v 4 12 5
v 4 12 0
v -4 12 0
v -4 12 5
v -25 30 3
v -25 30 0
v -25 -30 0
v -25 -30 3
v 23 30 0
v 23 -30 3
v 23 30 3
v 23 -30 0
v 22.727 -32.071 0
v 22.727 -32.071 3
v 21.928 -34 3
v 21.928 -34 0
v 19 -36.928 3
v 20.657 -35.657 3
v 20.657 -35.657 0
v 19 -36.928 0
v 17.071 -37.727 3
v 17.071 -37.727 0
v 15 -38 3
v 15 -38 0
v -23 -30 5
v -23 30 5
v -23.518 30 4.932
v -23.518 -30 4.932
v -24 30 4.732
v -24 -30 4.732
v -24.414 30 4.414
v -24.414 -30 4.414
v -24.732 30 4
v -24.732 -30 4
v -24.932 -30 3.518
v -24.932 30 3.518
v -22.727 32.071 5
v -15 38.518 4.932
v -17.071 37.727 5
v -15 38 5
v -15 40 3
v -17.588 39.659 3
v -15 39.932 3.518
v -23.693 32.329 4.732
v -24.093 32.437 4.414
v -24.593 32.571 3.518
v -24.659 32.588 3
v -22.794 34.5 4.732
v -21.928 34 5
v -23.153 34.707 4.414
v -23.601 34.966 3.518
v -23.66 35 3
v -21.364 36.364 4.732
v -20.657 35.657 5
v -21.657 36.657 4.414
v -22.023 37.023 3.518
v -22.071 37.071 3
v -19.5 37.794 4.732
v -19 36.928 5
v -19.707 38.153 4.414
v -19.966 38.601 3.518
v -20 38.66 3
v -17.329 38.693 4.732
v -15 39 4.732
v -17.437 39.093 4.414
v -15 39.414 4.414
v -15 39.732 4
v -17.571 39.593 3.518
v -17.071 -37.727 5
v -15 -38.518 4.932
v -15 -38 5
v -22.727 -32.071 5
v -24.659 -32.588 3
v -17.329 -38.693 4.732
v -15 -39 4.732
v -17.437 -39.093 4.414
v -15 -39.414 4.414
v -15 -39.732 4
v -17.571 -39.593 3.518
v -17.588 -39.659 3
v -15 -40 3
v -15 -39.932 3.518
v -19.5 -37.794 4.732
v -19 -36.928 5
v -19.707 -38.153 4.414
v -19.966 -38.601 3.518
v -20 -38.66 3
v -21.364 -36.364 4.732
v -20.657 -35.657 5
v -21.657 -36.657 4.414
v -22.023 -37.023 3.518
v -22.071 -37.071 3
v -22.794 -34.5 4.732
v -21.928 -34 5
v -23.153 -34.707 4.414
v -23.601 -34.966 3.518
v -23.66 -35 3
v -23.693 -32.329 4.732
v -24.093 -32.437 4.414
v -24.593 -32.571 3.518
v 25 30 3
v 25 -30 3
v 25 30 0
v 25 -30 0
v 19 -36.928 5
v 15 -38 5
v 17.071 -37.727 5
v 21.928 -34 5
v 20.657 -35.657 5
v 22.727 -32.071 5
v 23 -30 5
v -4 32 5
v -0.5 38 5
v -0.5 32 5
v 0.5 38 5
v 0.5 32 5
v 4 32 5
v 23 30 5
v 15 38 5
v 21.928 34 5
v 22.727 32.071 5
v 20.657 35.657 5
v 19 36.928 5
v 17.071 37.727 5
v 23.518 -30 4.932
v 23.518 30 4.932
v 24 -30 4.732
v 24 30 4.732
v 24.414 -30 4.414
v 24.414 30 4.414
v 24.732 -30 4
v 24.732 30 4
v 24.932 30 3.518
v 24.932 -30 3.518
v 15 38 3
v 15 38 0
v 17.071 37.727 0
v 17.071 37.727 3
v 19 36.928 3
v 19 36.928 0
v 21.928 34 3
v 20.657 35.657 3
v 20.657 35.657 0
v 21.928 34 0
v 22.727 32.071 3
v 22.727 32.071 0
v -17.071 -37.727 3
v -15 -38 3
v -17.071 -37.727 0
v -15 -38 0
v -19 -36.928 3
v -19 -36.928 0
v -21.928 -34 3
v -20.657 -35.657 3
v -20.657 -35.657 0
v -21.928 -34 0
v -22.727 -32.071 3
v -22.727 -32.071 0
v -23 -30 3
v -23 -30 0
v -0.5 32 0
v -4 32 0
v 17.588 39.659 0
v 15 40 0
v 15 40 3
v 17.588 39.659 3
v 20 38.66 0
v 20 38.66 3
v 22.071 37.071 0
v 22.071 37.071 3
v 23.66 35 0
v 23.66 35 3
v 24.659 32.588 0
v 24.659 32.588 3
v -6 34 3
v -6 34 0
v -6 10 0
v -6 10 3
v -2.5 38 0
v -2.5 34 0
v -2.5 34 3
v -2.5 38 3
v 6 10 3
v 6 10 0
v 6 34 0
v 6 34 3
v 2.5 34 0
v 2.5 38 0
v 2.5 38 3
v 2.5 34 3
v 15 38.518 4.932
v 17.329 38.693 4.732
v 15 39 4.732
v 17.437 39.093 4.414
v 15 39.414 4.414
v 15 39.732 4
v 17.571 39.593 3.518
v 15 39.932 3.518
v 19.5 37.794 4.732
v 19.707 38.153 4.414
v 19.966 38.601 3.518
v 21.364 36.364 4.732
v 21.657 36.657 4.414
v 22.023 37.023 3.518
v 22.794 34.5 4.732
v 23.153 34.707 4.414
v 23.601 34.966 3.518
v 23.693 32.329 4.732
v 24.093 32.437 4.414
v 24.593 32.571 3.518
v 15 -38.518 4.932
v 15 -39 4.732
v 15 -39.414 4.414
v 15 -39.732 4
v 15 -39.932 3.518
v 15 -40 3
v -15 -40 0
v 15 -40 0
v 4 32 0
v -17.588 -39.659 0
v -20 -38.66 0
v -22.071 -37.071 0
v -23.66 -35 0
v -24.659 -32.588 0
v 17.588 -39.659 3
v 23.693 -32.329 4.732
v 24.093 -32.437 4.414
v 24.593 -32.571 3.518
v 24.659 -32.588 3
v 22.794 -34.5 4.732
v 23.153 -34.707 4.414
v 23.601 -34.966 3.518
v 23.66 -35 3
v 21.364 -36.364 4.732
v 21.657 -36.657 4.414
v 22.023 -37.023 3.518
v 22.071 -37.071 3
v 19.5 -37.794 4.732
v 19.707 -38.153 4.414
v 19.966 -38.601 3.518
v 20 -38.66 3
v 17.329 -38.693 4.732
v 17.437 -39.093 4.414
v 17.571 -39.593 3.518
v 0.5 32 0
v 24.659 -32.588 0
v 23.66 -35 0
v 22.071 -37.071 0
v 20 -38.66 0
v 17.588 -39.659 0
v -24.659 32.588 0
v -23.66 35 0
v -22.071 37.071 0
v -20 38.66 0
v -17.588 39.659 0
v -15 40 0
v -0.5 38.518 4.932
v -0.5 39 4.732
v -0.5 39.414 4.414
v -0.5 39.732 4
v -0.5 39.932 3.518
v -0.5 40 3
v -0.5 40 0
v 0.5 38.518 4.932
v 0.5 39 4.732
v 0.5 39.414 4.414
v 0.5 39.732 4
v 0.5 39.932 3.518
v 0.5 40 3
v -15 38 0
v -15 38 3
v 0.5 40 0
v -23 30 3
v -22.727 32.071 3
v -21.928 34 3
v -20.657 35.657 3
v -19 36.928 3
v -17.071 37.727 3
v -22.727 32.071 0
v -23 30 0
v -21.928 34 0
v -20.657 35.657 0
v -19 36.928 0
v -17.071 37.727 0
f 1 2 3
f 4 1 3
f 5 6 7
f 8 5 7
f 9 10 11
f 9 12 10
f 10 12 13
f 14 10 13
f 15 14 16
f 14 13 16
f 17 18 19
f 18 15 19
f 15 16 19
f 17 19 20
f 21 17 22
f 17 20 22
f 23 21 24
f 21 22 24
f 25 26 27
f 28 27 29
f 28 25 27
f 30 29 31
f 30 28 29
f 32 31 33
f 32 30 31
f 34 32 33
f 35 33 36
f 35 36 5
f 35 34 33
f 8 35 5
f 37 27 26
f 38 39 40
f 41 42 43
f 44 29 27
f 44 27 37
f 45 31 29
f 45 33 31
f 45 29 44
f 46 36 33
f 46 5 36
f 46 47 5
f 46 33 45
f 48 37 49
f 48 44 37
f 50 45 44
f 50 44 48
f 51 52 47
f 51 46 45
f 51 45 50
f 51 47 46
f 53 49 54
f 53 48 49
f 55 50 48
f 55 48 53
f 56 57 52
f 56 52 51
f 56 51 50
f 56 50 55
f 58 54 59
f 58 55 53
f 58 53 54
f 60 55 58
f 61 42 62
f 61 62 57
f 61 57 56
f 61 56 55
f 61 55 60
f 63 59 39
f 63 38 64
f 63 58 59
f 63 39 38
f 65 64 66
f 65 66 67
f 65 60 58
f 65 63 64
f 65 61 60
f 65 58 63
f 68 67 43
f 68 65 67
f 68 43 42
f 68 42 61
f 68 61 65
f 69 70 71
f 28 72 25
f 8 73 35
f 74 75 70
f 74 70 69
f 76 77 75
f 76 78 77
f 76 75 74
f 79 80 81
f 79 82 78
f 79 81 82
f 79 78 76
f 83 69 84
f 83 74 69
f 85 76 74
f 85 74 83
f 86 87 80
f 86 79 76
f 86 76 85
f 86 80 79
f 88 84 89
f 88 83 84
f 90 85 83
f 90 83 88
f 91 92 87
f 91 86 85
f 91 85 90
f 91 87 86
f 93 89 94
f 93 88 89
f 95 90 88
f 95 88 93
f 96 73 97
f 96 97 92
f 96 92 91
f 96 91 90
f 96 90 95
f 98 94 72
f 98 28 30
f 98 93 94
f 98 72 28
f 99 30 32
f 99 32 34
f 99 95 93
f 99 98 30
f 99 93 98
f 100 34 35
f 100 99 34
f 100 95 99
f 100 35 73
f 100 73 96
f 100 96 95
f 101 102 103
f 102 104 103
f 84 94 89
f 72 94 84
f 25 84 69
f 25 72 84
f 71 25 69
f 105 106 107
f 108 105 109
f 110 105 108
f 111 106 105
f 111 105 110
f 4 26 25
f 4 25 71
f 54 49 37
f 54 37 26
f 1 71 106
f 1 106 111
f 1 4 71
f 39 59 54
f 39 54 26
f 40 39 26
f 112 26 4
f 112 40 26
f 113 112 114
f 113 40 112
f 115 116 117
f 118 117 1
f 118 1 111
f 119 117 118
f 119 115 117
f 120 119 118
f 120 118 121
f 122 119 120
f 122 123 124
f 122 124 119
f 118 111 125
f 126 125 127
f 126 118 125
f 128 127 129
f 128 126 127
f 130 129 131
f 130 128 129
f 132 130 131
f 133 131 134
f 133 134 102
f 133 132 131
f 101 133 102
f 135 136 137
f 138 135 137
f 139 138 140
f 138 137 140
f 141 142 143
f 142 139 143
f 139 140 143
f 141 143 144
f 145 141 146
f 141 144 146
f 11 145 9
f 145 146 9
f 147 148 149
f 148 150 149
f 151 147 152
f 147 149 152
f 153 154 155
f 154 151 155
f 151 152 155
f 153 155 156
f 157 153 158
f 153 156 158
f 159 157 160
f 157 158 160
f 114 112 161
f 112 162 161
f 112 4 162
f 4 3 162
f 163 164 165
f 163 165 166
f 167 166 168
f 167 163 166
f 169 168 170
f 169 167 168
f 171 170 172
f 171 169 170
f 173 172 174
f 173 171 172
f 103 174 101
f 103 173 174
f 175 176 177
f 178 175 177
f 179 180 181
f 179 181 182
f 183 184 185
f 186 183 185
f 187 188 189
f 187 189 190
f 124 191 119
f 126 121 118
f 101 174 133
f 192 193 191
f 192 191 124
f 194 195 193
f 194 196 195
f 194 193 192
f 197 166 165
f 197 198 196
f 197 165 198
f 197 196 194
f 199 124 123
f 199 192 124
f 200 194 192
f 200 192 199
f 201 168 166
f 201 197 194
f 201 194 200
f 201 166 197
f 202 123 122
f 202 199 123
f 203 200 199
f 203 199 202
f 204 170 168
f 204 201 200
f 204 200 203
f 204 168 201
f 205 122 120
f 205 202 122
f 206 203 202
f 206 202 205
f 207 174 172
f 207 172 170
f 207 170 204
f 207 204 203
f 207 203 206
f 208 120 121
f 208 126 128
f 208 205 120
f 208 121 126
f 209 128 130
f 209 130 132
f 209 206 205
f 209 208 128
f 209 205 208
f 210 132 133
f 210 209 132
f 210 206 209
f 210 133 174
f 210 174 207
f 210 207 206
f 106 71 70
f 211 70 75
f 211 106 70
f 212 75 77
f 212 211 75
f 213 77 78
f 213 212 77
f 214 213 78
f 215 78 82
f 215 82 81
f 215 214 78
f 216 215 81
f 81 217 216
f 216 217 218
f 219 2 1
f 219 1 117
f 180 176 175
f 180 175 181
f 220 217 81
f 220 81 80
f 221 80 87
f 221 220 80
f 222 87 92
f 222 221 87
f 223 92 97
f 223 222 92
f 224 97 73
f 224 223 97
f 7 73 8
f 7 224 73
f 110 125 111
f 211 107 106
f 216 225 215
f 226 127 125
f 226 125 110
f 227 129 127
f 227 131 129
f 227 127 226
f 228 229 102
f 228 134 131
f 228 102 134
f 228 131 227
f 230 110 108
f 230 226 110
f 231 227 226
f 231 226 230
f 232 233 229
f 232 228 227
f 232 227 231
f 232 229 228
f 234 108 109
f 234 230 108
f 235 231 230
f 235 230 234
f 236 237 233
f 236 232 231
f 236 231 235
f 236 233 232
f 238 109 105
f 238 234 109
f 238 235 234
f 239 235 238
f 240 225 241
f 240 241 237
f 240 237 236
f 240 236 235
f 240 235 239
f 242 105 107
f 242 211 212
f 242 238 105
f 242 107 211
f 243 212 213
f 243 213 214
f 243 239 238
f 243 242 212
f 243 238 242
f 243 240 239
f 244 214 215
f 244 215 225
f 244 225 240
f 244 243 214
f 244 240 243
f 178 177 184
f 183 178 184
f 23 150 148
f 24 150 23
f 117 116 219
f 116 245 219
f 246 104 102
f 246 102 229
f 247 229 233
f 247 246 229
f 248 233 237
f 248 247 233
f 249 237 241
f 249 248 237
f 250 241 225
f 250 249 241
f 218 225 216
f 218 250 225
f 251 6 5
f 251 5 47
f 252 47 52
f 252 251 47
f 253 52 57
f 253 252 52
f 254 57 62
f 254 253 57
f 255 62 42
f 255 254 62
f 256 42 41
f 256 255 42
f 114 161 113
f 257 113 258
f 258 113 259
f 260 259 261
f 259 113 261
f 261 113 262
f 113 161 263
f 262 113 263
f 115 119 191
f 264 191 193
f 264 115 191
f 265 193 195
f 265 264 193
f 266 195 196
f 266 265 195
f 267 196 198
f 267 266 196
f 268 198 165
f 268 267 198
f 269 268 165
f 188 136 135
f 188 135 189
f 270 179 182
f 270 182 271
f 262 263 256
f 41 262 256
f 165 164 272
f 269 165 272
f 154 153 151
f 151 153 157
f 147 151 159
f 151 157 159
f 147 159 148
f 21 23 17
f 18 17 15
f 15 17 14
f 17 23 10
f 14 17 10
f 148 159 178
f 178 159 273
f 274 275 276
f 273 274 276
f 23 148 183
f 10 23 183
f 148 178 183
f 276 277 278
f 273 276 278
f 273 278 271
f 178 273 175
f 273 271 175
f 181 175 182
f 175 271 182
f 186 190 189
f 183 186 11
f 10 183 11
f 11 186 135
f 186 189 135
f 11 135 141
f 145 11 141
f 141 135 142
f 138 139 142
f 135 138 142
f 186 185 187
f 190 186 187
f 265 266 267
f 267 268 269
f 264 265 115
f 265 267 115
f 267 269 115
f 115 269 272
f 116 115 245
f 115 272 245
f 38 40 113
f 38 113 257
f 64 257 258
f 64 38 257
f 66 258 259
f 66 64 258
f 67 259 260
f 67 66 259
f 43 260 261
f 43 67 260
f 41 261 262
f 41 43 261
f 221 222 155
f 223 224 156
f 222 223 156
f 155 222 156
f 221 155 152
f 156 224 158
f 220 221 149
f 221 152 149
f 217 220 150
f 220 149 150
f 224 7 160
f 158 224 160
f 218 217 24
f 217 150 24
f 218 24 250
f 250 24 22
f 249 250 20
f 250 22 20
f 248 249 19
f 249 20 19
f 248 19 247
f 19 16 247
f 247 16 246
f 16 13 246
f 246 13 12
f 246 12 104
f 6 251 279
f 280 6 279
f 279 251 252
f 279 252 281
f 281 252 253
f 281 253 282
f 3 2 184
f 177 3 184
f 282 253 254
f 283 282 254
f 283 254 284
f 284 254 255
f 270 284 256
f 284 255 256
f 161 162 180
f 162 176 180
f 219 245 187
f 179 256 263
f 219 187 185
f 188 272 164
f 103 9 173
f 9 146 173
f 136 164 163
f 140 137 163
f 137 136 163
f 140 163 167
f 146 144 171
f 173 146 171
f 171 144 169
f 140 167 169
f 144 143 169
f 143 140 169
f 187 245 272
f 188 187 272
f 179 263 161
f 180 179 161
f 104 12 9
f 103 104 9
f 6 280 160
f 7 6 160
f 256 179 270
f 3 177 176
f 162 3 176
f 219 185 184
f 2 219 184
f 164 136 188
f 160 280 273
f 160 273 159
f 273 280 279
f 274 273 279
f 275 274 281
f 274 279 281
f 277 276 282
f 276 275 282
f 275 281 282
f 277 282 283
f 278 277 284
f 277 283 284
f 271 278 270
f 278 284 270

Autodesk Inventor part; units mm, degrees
ref_plane "YZ Plane" through (0, 0, 0) normal (1, 0, 0) x (0, 1, 0)
ref_plane "XZ Plane" through (0, 0, 0) normal (0, 1, 0) x (-1, 0, 0)
ref_plane "XY Plane" through (0, 0, 0) normal (0, 0, 1) x (1, 0, 0)
sketch "Esboço3" plane through (0, 0, 0) normal (0, 0, 1) x (1, 0, 0)
  arc A0 (-23, -30) -> (-15, -38) centre (-15, -30) ccw projected
  line L0 (-23, -30) -> (-23, 30) projected
  arc A1 (-15, 38) -> (-23, 30) centre (-15, 30) ccw projected
  line L1 (-15, 38) -> (15, 38) projected
  arc A2 (23, 30) -> (15, 38) centre (15, 30) ccw projected
  line L2 (23, 30) -> (23, -30) projected
  arc A3 (15, -38) -> (23, -30) centre (15, -30) ccw projected
  line L3 (15, -38) -> (-15, -38) projected
  arc A4 (-25, -30) -> (-15, -40) centre (-15, -30) ccw projected
  line L4 (-15, -40) -> (15, -40) projected
  arc A5 (15, -40) -> (25, -30) centre (15, -30) ccw projected
  line L5 (25, -30) -> (25, 30) projected
  arc A6 (25, 30) -> (15, 40) centre (15, 30) ccw projected
  line L6 (15, 40) -> (-15, 40) projected
  arc A7 (-15, 40) -> (-25, 30) centre (-15, 30) ccw projected
  line L7 (-25, 30) -> (-25, -30) projected
  line L8 (-4, 12) -> (-4, 32) projected
  line L9 (-4, 32) -> (4, 32) projected
  line L10 (4, 12) -> (4, 32) projected
  line L11 (4, 12) -> (-4, 12) projected
  line L12 (-0.5, 40) -> (0.5, 40)
  line L13 (0.5, 40) -> (0.5, 32)
  line L14 (0.5, 32) -> (-0.5, 32)
  line L15 (-0.5, 32) -> (-0.5, 40)
  point P0 (0, 0)
  point P1 (0.5, 36)
  point P2 (0, 32)
  point P3 (-0.5, 38)
  point P4 (0.5, 38)
  dimension "d2" = 1
  dimension "d3" = 0
  dimension "d4" = 3.5
extrude "Extrusão1" add sketch "Esboço3" along normal blind 5 contours L0 A1 L1 L15 L9 L8 L11 L10 L13 A2 L2 A3 L3 A0 | A0 L3 A3 L2 A2 L1 L13 L6 A6 L5 A5 L4 A4 L7 A7 L15 A1 L0
fillet "Arredondamento1" radius 2 9 edges at (-22.0711, 37.0711, 5) (-25, 0, 5) (-22.0711, -37.0711, 5) (0, -40, 5) (22.0711, -37.0711, 5) (25, 0, 5) (22.0711, 37.0711, 5) (7.75, 40, 5) (-7.75, 40, 5)
shell "Casca1" thickness 2 removed faces 1 at (1.3333, -22.6667, 0)
properties part number "Tampa"
